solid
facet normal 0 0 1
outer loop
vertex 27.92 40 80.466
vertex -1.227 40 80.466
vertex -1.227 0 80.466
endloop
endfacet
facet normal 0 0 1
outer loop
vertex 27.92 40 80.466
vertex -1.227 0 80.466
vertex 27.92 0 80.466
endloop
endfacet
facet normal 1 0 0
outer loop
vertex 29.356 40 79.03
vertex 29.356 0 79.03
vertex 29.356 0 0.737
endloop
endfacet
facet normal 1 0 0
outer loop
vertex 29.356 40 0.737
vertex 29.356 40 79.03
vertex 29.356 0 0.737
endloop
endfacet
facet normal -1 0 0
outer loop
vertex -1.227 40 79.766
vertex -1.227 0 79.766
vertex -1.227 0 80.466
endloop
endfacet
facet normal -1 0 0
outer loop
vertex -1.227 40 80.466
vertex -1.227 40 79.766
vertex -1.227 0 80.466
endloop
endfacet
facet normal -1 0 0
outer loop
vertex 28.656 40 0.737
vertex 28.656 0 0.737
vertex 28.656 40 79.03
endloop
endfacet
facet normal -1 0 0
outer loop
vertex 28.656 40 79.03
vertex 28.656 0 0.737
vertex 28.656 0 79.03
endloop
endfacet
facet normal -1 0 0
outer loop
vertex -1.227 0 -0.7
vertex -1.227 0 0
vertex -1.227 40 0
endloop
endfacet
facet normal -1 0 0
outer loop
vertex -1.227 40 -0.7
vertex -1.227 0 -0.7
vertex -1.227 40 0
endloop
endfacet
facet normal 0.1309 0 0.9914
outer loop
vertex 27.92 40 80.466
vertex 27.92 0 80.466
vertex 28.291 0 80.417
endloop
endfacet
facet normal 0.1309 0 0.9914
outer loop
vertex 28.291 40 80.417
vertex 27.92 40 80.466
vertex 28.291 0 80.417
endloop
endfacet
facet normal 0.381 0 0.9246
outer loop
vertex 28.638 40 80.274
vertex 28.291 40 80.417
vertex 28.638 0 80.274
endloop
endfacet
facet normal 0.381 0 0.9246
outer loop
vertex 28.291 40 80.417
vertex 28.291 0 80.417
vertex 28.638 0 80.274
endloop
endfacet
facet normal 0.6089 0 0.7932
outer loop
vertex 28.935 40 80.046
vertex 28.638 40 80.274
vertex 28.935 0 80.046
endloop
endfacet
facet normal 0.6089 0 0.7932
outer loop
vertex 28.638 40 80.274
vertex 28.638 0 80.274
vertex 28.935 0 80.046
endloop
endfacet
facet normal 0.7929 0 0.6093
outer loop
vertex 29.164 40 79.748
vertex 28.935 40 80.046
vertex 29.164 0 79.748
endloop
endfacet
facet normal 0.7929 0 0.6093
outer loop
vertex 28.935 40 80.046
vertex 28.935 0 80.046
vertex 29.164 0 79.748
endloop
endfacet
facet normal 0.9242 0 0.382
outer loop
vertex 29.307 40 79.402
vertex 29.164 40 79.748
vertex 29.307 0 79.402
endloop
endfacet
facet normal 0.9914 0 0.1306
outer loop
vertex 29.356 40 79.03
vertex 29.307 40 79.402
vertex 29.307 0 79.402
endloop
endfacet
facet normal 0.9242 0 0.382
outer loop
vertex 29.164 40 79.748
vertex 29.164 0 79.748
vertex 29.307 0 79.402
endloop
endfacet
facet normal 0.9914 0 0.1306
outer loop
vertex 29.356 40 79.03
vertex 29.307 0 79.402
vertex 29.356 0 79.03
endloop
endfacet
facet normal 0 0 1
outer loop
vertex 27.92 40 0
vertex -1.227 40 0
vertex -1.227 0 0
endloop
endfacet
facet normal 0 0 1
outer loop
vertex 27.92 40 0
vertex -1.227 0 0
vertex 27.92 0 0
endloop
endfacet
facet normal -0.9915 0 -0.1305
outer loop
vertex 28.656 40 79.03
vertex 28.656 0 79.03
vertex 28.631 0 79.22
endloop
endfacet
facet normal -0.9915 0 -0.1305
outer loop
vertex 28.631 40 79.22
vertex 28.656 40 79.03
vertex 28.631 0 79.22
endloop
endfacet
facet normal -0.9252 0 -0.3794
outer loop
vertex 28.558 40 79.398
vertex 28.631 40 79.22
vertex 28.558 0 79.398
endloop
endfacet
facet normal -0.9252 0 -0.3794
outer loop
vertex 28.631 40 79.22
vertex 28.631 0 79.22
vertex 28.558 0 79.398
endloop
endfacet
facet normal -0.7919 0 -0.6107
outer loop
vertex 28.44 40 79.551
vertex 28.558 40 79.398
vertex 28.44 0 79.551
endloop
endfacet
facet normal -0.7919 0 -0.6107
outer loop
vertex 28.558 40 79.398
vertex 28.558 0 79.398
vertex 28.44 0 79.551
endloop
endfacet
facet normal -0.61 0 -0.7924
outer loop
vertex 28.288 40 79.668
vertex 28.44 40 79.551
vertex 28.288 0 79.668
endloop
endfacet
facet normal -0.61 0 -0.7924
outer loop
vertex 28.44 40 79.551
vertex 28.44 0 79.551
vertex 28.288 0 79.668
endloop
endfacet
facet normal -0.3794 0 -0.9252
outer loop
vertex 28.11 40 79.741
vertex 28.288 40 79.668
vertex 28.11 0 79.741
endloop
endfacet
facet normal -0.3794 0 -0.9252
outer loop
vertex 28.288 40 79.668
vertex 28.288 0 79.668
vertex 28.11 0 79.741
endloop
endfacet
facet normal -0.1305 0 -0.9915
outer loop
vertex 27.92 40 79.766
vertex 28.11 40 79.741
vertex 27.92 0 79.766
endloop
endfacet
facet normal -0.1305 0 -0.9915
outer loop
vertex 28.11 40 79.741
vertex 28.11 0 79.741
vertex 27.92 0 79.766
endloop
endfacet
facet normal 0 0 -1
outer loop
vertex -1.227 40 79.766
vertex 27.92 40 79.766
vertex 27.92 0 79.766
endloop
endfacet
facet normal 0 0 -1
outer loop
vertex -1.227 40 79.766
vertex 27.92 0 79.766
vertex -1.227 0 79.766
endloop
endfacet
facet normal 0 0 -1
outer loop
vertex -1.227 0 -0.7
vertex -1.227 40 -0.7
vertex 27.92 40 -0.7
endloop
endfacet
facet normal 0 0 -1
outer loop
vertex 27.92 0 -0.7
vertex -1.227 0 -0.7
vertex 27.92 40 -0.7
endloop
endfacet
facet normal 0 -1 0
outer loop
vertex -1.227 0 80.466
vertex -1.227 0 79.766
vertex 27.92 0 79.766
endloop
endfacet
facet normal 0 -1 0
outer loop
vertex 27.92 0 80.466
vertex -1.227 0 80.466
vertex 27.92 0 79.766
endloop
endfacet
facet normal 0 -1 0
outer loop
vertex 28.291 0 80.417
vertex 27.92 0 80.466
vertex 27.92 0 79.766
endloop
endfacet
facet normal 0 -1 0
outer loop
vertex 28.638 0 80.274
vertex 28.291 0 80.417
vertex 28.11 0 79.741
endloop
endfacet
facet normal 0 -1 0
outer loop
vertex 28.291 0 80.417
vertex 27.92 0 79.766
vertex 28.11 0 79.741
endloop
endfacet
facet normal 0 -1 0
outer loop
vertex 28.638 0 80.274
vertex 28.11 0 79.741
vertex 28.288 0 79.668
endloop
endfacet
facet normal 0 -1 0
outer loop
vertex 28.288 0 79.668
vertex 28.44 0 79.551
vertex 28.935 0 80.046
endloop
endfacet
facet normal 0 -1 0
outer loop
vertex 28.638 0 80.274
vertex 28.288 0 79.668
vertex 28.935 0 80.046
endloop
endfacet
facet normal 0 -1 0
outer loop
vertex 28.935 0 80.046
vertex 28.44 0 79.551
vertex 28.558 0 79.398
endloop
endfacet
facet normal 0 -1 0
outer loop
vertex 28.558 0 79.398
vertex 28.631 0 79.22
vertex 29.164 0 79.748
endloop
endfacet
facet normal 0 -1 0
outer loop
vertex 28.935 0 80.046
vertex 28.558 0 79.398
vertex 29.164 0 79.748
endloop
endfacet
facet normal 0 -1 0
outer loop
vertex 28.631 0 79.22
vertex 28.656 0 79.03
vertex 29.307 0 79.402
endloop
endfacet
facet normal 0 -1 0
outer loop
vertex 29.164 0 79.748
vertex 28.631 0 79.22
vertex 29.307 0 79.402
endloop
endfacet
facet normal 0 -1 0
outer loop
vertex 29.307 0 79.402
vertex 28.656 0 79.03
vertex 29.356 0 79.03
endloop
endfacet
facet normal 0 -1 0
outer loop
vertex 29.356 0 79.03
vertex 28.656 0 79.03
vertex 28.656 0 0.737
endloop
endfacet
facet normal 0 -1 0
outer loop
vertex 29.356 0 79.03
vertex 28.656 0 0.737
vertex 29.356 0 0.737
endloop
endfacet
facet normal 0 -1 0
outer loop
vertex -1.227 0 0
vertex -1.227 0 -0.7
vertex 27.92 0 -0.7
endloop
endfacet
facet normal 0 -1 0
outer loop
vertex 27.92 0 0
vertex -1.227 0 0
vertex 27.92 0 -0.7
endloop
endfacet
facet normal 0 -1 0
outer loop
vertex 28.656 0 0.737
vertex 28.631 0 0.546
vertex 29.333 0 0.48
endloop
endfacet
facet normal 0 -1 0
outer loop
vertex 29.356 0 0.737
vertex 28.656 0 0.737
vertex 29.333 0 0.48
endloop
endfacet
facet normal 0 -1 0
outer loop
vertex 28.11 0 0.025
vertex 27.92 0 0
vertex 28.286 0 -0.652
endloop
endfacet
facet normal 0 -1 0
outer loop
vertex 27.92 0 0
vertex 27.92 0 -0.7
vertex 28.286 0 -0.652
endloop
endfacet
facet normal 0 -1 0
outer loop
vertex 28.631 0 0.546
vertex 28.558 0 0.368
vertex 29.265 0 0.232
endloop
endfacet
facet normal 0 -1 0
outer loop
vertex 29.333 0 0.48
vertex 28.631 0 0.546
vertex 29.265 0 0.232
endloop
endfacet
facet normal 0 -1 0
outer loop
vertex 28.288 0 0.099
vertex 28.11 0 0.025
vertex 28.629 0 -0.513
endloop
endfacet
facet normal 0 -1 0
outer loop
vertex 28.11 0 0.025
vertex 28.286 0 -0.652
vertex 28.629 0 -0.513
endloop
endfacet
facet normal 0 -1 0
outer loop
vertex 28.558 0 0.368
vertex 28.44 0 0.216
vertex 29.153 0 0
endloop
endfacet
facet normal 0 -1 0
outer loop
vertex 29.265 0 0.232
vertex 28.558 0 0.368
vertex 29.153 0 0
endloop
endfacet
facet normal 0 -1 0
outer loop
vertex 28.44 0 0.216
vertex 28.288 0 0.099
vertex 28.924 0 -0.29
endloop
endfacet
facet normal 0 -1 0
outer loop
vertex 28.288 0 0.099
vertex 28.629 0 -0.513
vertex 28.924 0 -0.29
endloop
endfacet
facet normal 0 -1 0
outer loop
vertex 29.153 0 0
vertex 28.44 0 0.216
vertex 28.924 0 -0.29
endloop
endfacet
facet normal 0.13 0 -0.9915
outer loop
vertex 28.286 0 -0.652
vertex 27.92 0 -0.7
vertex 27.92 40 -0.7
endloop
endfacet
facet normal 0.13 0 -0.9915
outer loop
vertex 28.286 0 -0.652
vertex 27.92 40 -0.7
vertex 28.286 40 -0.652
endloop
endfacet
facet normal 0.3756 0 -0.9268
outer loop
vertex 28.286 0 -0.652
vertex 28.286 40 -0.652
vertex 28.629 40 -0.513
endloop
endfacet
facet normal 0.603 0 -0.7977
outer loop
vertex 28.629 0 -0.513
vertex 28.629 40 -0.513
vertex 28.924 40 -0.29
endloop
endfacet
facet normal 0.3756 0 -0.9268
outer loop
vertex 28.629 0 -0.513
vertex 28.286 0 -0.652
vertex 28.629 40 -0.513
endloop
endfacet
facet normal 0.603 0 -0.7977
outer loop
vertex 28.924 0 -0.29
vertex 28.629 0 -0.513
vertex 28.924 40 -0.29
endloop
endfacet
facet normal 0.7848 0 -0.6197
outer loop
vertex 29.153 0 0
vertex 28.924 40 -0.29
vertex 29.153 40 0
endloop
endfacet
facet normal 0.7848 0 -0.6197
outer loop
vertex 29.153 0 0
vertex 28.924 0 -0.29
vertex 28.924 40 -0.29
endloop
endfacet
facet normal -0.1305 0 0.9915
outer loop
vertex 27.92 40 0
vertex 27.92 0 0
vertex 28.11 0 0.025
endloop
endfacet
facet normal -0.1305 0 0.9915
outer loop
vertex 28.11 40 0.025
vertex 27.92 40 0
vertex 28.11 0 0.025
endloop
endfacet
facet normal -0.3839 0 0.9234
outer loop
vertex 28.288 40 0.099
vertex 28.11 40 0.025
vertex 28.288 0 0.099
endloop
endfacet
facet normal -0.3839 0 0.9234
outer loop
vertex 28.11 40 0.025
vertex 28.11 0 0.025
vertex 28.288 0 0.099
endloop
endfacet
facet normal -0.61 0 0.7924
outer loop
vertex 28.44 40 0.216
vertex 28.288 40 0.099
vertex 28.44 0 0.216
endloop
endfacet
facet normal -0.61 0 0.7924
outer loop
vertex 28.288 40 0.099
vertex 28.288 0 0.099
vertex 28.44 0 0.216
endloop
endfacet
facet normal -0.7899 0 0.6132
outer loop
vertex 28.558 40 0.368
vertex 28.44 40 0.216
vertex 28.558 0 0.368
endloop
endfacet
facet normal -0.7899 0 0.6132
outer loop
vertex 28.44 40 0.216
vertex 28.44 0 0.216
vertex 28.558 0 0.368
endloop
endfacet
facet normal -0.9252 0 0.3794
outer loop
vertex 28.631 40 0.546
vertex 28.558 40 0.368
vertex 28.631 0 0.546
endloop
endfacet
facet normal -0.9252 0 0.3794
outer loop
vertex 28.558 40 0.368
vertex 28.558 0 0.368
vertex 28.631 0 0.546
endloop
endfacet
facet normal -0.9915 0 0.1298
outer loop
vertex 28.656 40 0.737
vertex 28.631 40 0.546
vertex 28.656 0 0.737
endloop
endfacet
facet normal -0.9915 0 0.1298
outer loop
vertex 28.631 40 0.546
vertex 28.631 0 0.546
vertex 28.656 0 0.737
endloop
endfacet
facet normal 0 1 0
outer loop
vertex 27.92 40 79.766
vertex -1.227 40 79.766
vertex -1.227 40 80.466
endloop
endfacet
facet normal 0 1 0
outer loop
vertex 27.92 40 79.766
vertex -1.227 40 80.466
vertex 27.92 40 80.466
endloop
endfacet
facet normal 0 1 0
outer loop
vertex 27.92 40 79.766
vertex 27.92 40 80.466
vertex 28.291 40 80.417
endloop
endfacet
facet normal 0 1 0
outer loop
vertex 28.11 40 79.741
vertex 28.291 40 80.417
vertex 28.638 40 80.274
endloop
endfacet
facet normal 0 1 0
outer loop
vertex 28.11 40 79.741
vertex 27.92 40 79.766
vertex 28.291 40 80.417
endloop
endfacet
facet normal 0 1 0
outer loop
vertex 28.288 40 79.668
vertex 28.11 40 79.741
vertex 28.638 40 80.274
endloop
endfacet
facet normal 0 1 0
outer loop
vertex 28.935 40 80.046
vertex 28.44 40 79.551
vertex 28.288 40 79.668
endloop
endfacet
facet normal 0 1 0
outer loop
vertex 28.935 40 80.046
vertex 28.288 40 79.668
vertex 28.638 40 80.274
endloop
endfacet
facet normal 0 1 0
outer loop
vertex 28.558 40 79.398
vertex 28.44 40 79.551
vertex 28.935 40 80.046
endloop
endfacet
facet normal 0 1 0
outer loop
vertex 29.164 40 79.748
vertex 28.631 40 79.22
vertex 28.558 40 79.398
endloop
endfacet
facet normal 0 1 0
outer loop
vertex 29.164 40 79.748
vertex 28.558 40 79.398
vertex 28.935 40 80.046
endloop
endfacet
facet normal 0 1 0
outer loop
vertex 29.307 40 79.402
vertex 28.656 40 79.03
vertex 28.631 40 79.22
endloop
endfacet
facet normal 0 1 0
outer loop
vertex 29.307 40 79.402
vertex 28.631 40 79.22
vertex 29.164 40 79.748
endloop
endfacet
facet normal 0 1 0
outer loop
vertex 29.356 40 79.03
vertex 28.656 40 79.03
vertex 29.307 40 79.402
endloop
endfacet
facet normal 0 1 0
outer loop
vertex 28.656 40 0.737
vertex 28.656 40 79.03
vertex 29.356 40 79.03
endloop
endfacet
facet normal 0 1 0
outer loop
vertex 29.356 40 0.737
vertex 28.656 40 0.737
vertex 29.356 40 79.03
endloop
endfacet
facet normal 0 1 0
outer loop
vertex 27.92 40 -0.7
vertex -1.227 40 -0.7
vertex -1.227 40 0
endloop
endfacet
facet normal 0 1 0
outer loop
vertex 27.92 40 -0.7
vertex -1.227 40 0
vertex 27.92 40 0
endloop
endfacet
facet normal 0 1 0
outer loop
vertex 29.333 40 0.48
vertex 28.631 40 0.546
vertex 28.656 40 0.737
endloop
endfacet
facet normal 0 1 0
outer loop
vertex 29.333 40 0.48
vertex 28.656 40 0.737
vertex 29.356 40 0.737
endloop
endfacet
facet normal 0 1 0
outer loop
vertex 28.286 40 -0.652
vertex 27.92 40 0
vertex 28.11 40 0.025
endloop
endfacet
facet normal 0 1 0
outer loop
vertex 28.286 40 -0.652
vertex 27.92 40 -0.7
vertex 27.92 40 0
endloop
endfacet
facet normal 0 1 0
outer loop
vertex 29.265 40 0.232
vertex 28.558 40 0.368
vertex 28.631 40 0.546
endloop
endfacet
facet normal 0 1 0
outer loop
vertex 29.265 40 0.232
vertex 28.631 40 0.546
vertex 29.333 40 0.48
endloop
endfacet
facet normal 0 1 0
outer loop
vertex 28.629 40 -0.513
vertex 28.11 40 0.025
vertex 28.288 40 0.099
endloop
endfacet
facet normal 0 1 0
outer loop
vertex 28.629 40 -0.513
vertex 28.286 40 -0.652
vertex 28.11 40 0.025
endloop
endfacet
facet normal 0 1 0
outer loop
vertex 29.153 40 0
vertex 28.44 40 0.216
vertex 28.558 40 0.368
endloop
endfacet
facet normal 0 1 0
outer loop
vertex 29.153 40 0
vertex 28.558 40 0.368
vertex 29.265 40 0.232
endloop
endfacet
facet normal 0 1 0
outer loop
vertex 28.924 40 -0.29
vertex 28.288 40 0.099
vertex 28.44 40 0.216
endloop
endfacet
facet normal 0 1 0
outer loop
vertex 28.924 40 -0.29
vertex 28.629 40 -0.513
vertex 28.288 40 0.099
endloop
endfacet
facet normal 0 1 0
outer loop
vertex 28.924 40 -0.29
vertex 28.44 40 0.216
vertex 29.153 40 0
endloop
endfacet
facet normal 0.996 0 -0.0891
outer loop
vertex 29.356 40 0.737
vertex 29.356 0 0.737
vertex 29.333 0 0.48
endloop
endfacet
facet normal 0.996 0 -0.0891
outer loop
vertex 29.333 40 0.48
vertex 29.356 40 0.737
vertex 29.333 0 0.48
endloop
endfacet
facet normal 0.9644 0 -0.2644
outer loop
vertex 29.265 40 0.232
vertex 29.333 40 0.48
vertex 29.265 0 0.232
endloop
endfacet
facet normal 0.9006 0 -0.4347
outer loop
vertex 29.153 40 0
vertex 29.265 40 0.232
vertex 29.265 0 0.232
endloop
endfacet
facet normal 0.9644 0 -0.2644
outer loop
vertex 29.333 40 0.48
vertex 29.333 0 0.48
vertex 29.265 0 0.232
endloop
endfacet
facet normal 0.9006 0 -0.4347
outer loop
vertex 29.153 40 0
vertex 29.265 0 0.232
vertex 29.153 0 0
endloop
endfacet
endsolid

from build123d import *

# Parameters (mm, degrees)
SKETCH1_W              = 140
SKETCH1_H              = 40
BASE_FLANGE1_DEPTH     = 0.7
SKETCHED_BEND1_DEPTH   = 40
SKETCHED_BEND1_2_DEPTH = 40


# Read off the part's stored shape, not the designer's step: Sketched Bend1
# Sheet-metal steps are written as plain solids
with BuildPart() as part:
    # Sketch1 → Base-Flange1 (new body)
    with BuildSketch(Plane.XY):
        with Locations((68.773006135, 20)):
            Rectangle(SKETCH1_W, SKETCH1_H)
    extrude(amount=-BASE_FLANGE1_DEPTH)

    # Sketched Bend1 outline → Sketched Bend1 (cut)
    with BuildSketch(Plane(origin=(0, 0, 0), x_dir=(1, 0, 0), z_dir=(0, 1, 0))):
        with BuildLine():
            ThreePointArc((27.919592491, 0.7), (28.628683458, 0.512803681), (29.152978075, 0))
            Line((29.152978075, 0), (138.773006135, 0))
            Line((138.773006135, 0), (138.773006135, 0.7))
            Line((138.773006135, 0.7), (27.919592491, 0.7))
        make_face()
    extrude(amount=SKETCHED_BEND1_DEPTH, mode=Mode.SUBTRACT)

    # Sketched Bend1 2 outline → Sketched Bend1 2 (add)
    with BuildSketch(Plane(origin=(0, 0, 0), x_dir=(1, 0, 0), z_dir=(0, 1, 0))):
        with BuildLine():
            ThreePointArc((27.919592491, 0), (28.440447346, -0.215745145), (28.656192491, -0.7366))
            Line((28.656192491, -0.7366), (28.656192491, -79.029772711))
            ThreePointArc((28.656192491, -79.029772711), (28.440447346, -79.550627566), (27.919592491, -79.766372711))
            Line((27.919592491, -79.766372711), (-1.226993865, -79.766372711))
            Line((-1.226993865, -79.766372711), (-1.226993865, -80.466372711))
            Line((-1.226993865, -80.466372711), (27.919592491, -80.466372711))
            ThreePointArc((27.919592491, -80.466372711), (28.935422092, -80.045602313), (29.356192491, -79.029772711))
            Line((29.356192491, -79.029772711), (29.356192491, -0.7366))
            ThreePointArc((29.356192491, -0.7366), (29.304457338, -0.354541216), (29.152978075, 0))
            Line((29.152978075, 0), (27.919592491, 0))
        make_face()
    extrude(amount=SKETCHED_BEND1_2_DEPTH)


solid = part.part
